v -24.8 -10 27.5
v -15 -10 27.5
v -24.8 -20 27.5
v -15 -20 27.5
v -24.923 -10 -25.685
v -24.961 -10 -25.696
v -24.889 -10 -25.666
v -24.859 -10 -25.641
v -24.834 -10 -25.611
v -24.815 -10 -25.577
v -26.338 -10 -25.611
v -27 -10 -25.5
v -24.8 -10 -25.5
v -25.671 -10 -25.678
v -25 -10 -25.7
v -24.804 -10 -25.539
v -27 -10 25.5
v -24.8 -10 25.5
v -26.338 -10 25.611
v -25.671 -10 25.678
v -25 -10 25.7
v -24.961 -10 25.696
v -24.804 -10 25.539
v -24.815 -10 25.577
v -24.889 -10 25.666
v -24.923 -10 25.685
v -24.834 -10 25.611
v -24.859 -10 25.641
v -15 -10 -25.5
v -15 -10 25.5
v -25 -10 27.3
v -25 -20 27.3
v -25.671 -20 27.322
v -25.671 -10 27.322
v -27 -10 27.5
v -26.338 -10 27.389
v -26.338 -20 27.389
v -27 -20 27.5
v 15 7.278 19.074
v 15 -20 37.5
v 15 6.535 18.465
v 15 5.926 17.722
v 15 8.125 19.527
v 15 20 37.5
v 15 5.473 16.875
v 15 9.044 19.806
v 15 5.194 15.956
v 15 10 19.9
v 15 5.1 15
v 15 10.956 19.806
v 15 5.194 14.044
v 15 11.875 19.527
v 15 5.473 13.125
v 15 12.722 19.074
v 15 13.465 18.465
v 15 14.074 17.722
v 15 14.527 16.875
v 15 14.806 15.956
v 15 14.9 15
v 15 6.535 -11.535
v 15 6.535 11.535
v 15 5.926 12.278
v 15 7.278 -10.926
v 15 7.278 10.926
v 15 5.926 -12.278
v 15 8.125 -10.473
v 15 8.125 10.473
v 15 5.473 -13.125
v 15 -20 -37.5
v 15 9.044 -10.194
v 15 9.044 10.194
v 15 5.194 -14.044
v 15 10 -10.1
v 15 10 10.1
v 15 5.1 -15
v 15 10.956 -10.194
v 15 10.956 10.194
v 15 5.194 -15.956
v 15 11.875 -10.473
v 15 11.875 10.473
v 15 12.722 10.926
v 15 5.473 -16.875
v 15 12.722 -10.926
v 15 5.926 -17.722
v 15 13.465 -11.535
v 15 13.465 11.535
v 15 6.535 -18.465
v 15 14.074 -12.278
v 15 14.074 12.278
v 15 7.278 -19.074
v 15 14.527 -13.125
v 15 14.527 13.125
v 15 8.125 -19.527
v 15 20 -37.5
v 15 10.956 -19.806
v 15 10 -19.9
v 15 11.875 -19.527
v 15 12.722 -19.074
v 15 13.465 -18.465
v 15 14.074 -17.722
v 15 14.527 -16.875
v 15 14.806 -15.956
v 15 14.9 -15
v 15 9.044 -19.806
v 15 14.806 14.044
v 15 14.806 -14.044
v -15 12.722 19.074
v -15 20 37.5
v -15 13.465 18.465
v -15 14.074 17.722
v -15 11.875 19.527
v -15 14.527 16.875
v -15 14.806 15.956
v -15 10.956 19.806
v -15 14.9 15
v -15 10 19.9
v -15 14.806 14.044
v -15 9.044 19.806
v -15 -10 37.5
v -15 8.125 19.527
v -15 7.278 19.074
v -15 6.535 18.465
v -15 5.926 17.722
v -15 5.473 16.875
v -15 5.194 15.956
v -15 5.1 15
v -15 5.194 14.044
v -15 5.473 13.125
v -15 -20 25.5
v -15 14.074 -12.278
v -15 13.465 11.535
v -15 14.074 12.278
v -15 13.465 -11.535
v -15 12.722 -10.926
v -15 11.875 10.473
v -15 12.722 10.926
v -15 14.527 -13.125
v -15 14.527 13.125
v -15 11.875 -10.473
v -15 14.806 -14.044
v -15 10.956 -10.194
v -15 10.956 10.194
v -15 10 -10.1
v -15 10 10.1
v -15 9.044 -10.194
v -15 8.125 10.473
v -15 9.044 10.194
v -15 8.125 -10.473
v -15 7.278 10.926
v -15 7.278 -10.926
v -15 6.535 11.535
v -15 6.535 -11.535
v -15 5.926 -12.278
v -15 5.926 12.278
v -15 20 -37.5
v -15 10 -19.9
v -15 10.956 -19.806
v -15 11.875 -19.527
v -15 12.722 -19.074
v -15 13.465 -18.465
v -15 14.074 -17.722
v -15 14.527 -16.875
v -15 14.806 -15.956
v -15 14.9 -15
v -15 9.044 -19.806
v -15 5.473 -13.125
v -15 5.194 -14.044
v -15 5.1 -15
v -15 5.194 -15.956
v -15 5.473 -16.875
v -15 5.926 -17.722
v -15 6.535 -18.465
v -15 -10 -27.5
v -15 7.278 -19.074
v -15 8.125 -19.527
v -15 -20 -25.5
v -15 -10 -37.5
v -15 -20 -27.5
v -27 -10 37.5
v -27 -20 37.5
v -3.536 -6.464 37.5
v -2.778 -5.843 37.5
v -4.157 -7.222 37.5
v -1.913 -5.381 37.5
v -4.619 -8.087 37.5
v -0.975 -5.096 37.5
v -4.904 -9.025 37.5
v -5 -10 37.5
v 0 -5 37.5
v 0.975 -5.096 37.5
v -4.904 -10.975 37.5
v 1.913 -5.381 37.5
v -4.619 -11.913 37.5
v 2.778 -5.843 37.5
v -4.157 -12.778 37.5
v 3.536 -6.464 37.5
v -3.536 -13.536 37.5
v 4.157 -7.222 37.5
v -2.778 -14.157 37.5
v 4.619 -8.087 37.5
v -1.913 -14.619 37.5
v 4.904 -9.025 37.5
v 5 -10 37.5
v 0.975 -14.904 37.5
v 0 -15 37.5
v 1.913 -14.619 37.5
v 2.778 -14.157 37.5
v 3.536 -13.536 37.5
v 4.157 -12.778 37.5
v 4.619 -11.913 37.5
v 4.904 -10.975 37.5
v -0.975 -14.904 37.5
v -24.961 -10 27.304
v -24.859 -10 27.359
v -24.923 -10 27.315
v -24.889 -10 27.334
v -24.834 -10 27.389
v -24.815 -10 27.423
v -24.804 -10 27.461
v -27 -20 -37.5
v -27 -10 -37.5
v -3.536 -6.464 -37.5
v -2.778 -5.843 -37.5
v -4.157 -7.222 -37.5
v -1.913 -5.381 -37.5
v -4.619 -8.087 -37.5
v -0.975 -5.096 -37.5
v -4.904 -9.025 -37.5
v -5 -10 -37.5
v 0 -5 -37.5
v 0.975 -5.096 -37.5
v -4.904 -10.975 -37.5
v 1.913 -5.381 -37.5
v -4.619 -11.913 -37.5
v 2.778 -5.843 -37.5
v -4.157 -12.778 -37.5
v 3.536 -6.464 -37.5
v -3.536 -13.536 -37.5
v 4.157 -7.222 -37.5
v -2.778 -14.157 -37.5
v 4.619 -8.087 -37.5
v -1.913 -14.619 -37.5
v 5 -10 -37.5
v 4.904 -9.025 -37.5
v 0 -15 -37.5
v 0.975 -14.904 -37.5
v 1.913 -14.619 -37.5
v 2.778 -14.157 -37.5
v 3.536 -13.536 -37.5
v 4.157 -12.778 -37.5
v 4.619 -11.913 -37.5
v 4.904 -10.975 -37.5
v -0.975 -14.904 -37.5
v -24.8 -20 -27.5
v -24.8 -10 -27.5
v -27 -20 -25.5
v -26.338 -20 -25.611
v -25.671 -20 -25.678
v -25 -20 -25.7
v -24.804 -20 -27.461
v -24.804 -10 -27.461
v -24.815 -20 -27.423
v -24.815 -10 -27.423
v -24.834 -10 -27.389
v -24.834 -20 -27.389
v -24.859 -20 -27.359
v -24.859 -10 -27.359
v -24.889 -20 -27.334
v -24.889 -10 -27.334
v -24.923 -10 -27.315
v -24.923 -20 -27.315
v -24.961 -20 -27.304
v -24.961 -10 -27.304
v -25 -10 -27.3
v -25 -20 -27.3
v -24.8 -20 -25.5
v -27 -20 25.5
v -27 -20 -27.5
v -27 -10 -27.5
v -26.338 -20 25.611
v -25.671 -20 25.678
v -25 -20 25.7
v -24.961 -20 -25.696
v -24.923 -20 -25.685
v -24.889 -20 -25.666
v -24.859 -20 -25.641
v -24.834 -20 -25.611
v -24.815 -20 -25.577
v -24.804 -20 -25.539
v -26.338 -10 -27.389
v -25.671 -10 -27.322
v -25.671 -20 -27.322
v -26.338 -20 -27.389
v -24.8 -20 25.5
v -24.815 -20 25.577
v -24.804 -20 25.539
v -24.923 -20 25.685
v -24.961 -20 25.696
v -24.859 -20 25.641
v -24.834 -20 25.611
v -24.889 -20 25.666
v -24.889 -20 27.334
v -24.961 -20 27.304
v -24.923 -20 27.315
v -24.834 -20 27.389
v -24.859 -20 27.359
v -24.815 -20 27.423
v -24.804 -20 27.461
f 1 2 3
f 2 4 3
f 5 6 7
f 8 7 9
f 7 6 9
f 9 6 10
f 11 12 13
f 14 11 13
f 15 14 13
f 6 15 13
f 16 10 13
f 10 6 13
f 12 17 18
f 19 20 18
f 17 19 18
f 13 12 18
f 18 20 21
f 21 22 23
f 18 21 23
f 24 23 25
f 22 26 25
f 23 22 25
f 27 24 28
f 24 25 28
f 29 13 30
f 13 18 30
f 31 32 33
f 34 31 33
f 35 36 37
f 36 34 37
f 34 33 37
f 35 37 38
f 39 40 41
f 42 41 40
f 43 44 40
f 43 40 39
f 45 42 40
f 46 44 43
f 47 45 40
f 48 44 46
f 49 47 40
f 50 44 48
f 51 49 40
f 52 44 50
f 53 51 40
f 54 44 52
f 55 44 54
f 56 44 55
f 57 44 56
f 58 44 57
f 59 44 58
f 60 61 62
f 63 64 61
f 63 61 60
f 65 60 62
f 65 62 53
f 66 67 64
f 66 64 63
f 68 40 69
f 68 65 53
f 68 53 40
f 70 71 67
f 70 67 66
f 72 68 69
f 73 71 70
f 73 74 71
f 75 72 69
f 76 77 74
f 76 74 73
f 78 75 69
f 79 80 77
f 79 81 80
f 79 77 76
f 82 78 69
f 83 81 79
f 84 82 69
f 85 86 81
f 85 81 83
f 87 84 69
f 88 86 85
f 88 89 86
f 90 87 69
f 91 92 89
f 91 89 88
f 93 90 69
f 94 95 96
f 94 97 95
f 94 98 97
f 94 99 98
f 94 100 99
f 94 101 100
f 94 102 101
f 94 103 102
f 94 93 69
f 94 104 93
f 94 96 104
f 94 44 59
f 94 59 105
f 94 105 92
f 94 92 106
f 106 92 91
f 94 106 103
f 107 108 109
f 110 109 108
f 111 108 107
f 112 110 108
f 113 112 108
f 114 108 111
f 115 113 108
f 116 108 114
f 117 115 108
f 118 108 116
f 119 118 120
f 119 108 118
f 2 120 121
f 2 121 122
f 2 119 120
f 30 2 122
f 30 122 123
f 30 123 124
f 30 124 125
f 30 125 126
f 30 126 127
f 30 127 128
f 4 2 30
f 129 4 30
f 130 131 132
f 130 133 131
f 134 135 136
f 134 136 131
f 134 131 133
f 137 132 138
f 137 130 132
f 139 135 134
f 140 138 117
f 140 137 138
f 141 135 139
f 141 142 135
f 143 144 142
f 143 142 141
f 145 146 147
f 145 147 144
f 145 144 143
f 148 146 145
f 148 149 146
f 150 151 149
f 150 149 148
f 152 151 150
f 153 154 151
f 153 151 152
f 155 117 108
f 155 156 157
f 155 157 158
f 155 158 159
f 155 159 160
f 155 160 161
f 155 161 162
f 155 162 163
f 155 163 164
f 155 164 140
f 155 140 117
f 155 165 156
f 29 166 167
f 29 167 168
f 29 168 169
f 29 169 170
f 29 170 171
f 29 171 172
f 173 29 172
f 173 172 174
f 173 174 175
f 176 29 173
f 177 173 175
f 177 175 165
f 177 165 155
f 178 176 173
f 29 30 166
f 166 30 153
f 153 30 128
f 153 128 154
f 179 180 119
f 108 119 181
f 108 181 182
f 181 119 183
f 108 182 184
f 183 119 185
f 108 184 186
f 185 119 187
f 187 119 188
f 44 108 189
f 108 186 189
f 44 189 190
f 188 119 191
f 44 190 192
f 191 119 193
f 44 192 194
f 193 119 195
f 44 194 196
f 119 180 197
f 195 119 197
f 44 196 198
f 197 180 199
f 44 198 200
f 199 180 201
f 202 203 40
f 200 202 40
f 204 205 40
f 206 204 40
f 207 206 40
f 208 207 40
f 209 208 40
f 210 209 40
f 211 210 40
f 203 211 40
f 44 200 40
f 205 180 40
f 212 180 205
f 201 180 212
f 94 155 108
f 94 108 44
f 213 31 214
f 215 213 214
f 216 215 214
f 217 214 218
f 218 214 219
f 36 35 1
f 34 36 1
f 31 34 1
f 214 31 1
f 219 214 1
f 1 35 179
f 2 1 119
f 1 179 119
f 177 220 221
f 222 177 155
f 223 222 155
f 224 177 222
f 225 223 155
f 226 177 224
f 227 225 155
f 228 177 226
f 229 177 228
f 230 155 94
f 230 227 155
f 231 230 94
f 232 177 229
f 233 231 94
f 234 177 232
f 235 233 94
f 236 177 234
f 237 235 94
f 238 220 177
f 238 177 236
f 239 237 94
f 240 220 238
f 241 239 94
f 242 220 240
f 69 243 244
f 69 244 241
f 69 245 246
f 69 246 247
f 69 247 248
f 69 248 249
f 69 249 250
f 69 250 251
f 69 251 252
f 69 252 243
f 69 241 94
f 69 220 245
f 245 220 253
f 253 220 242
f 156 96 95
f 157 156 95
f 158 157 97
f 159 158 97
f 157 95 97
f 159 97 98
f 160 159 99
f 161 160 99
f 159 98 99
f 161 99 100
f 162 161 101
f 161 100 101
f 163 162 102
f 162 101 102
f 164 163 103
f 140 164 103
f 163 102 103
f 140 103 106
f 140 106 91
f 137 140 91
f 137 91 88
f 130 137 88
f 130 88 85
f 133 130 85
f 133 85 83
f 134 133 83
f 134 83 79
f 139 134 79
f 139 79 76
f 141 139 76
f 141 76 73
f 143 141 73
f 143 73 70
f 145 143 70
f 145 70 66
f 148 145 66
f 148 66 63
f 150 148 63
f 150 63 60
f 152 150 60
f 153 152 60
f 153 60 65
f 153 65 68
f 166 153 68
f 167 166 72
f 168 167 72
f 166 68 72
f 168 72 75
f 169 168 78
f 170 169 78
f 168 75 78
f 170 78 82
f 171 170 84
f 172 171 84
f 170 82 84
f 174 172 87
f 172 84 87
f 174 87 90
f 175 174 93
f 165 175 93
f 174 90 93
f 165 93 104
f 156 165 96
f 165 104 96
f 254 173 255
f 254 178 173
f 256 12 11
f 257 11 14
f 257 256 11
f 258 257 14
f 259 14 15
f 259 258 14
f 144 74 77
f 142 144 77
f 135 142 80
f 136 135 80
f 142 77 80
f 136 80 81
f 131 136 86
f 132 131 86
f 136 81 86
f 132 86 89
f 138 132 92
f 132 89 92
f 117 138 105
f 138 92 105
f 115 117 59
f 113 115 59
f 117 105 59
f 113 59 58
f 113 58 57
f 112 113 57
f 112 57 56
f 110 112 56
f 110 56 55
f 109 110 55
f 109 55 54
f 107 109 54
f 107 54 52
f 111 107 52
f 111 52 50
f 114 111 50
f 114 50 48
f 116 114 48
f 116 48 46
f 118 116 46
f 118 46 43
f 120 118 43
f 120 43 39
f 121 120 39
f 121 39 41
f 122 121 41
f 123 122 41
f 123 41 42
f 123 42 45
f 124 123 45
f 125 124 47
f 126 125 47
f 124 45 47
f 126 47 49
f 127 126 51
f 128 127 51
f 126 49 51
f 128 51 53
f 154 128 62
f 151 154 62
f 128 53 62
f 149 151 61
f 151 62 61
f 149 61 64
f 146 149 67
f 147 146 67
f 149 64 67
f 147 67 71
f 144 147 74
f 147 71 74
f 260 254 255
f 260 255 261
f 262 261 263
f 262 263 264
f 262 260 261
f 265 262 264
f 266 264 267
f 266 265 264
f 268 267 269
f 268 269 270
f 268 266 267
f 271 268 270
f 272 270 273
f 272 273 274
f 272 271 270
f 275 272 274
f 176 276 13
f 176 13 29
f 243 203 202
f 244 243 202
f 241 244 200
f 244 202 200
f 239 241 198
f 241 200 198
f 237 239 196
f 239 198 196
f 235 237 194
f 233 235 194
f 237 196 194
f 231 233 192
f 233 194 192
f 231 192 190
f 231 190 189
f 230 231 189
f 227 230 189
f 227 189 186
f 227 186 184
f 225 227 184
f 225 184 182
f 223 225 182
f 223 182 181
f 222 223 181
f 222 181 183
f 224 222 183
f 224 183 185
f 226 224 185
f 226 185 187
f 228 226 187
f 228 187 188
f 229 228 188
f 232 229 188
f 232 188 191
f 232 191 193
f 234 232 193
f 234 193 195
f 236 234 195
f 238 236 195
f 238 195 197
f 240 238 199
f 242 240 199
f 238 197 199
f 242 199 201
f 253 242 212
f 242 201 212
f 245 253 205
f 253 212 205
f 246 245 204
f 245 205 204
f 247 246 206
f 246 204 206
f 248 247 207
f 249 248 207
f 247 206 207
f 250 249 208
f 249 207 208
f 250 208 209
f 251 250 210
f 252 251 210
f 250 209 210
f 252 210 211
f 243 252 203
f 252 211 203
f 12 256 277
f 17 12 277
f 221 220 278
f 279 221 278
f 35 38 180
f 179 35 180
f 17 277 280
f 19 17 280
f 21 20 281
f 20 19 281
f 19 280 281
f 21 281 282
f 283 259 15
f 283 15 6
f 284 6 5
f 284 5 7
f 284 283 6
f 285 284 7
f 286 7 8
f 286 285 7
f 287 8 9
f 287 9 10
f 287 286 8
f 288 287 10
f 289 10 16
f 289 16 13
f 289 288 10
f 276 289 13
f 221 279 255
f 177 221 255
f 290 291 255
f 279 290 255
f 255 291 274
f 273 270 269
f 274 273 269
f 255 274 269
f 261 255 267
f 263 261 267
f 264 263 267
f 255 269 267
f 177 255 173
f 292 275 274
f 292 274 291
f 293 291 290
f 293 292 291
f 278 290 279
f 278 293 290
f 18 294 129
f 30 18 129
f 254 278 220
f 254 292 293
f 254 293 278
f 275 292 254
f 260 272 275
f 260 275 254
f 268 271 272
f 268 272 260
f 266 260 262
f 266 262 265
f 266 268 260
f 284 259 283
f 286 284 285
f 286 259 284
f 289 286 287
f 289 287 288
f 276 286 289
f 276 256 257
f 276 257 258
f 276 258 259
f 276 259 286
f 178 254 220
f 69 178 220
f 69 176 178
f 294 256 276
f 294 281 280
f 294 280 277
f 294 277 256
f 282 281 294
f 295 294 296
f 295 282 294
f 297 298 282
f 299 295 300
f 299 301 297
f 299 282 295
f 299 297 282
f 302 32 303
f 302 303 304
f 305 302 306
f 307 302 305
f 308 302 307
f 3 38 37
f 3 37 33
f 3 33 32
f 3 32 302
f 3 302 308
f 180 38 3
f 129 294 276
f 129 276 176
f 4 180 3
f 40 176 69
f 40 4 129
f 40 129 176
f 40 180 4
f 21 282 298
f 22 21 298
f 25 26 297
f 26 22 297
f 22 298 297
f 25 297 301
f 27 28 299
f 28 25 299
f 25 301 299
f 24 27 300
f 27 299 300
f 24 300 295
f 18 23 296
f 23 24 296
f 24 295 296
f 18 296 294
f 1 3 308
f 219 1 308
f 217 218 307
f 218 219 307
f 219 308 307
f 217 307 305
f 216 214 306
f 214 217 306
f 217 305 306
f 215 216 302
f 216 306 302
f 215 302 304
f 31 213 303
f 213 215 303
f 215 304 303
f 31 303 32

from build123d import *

# Parameters (mm, degrees)
SKETCH1_W             = 30
SKETCH1_H             = 75
MAIN_BLOCK_DEPTH      = 20
FRAME_HOLE_REACH      = 81.057
SKETCH2_R             = 5
EM_ROD_HOLES_REACH    = 54.022
EM_ROD_HOLES_SKETCH_R = 4.9
SKETCH4_W             = 12
SKETCH4_H             = 75
BOSS_EXTRUDE1_DEPTH   = 10
CUT_EXTRUDE1_DEPTH    = 62.116691664


with BuildPart() as part:
    # Sketch1 → Main Block (new, symmetric)
    with BuildSketch(Plane(origin=(0, 0, 0), x_dir=(1, 0, 0), z_dir=(0, 1, 0))):
        Rectangle(SKETCH1_W, SKETCH1_H)
    extrude(amount=MAIN_BLOCK_DEPTH, both=True)

    # Sketch2 → Frame Hole (cut, up to next)
    with BuildSketch(Plane.XY.offset(37.5), mode=Mode.PRIVATE) as frame_hole_sk1:
        with Locations((0, -10)):
            Circle(SKETCH2_R)
    frame_hole_tool1 = extrude(frame_hole_sk1.sketch, amount=-FRAME_HOLE_REACH, mode=Mode.PRIVATE) & part.part
    add(frame_hole_tool1.solids().sort_by_distance((0, -10, 37.5))[0], mode=Mode.SUBTRACT)

    # EM Rod Holes Sketch → EM Rod Holes (cut, up to next)
    with BuildSketch(Plane(origin=(15, 0, 0), x_dir=(0, 0, -1), z_dir=(1, 0, 0)), mode=Mode.PRIVATE) as em_rod_holes_sk1:
        with Locations((-15, 10)):
            Circle(EM_ROD_HOLES_SKETCH_R)
    em_rod_holes_tool1 = extrude(em_rod_holes_sk1.sketch, amount=-EM_ROD_HOLES_REACH, mode=Mode.PRIVATE) & part.part
    # EM Rod Holes Sketch → EM Rod Holes (cut, up to next)
    with BuildSketch(Plane(origin=(15, 0, 0), x_dir=(0, 0, -1), z_dir=(1, 0, 0)), mode=Mode.PRIVATE) as em_rod_holes_sk2:
        with Locations((15, 10)):
            Circle(EM_ROD_HOLES_SKETCH_R)
    em_rod_holes_tool2 = extrude(em_rod_holes_sk2.sketch, amount=-EM_ROD_HOLES_REACH, mode=Mode.PRIVATE) & part.part
    add(em_rod_holes_tool1.solids().sort_by_distance((15, 10, 15))[0], mode=Mode.SUBTRACT)
    add(em_rod_holes_tool2.solids().sort_by_distance((15, 10, -15))[0], mode=Mode.SUBTRACT)

    # Sketch4 → Boss-Extrude1 (add)
    with BuildSketch(Plane.XZ.offset(20)):
        with Locations((-21, 0)):
            Rectangle(SKETCH4_W, SKETCH4_H)
    extrude(amount=-BOSS_EXTRUDE1_DEPTH)

    # Sketch6 → Cut-Extrude1 (cut, symmetric)
    with BuildSketch(Plane.XZ.offset(20)):
        with BuildLine():
            ThreePointArc((-25, 27.3), (-26.004987562, 27.350124379), (-27, 27.5))
            Line((-27, 27.5), (-27, 25.5))
            ThreePointArc((-27, 25.5), (-26.004987562, 25.649875621), (-25, 25.7))
            ThreePointArc((-25, 25.7), (-24.858578644, 25.641421356), (-24.8, 25.5))
            Line((-24.8, 25.5), (-15, 25.5))
            Line((-15, 25.5), (-15, 27.5))
            Line((-15, 27.5), (-24.8, 27.5))
            ThreePointArc((-24.8, 27.5), (-24.858578644, 27.358578644), (-25, 27.3))
        make_face()
    cut_extrude1 = extrude(amount=CUT_EXTRUDE1_DEPTH, both=True, mode=Mode.SUBTRACT)

    # Mirror1: Cut-Extrude1 across plane
    add(cut_extrude1.mirror(Plane.XY), mode=Mode.SUBTRACT)


solid = part.part
